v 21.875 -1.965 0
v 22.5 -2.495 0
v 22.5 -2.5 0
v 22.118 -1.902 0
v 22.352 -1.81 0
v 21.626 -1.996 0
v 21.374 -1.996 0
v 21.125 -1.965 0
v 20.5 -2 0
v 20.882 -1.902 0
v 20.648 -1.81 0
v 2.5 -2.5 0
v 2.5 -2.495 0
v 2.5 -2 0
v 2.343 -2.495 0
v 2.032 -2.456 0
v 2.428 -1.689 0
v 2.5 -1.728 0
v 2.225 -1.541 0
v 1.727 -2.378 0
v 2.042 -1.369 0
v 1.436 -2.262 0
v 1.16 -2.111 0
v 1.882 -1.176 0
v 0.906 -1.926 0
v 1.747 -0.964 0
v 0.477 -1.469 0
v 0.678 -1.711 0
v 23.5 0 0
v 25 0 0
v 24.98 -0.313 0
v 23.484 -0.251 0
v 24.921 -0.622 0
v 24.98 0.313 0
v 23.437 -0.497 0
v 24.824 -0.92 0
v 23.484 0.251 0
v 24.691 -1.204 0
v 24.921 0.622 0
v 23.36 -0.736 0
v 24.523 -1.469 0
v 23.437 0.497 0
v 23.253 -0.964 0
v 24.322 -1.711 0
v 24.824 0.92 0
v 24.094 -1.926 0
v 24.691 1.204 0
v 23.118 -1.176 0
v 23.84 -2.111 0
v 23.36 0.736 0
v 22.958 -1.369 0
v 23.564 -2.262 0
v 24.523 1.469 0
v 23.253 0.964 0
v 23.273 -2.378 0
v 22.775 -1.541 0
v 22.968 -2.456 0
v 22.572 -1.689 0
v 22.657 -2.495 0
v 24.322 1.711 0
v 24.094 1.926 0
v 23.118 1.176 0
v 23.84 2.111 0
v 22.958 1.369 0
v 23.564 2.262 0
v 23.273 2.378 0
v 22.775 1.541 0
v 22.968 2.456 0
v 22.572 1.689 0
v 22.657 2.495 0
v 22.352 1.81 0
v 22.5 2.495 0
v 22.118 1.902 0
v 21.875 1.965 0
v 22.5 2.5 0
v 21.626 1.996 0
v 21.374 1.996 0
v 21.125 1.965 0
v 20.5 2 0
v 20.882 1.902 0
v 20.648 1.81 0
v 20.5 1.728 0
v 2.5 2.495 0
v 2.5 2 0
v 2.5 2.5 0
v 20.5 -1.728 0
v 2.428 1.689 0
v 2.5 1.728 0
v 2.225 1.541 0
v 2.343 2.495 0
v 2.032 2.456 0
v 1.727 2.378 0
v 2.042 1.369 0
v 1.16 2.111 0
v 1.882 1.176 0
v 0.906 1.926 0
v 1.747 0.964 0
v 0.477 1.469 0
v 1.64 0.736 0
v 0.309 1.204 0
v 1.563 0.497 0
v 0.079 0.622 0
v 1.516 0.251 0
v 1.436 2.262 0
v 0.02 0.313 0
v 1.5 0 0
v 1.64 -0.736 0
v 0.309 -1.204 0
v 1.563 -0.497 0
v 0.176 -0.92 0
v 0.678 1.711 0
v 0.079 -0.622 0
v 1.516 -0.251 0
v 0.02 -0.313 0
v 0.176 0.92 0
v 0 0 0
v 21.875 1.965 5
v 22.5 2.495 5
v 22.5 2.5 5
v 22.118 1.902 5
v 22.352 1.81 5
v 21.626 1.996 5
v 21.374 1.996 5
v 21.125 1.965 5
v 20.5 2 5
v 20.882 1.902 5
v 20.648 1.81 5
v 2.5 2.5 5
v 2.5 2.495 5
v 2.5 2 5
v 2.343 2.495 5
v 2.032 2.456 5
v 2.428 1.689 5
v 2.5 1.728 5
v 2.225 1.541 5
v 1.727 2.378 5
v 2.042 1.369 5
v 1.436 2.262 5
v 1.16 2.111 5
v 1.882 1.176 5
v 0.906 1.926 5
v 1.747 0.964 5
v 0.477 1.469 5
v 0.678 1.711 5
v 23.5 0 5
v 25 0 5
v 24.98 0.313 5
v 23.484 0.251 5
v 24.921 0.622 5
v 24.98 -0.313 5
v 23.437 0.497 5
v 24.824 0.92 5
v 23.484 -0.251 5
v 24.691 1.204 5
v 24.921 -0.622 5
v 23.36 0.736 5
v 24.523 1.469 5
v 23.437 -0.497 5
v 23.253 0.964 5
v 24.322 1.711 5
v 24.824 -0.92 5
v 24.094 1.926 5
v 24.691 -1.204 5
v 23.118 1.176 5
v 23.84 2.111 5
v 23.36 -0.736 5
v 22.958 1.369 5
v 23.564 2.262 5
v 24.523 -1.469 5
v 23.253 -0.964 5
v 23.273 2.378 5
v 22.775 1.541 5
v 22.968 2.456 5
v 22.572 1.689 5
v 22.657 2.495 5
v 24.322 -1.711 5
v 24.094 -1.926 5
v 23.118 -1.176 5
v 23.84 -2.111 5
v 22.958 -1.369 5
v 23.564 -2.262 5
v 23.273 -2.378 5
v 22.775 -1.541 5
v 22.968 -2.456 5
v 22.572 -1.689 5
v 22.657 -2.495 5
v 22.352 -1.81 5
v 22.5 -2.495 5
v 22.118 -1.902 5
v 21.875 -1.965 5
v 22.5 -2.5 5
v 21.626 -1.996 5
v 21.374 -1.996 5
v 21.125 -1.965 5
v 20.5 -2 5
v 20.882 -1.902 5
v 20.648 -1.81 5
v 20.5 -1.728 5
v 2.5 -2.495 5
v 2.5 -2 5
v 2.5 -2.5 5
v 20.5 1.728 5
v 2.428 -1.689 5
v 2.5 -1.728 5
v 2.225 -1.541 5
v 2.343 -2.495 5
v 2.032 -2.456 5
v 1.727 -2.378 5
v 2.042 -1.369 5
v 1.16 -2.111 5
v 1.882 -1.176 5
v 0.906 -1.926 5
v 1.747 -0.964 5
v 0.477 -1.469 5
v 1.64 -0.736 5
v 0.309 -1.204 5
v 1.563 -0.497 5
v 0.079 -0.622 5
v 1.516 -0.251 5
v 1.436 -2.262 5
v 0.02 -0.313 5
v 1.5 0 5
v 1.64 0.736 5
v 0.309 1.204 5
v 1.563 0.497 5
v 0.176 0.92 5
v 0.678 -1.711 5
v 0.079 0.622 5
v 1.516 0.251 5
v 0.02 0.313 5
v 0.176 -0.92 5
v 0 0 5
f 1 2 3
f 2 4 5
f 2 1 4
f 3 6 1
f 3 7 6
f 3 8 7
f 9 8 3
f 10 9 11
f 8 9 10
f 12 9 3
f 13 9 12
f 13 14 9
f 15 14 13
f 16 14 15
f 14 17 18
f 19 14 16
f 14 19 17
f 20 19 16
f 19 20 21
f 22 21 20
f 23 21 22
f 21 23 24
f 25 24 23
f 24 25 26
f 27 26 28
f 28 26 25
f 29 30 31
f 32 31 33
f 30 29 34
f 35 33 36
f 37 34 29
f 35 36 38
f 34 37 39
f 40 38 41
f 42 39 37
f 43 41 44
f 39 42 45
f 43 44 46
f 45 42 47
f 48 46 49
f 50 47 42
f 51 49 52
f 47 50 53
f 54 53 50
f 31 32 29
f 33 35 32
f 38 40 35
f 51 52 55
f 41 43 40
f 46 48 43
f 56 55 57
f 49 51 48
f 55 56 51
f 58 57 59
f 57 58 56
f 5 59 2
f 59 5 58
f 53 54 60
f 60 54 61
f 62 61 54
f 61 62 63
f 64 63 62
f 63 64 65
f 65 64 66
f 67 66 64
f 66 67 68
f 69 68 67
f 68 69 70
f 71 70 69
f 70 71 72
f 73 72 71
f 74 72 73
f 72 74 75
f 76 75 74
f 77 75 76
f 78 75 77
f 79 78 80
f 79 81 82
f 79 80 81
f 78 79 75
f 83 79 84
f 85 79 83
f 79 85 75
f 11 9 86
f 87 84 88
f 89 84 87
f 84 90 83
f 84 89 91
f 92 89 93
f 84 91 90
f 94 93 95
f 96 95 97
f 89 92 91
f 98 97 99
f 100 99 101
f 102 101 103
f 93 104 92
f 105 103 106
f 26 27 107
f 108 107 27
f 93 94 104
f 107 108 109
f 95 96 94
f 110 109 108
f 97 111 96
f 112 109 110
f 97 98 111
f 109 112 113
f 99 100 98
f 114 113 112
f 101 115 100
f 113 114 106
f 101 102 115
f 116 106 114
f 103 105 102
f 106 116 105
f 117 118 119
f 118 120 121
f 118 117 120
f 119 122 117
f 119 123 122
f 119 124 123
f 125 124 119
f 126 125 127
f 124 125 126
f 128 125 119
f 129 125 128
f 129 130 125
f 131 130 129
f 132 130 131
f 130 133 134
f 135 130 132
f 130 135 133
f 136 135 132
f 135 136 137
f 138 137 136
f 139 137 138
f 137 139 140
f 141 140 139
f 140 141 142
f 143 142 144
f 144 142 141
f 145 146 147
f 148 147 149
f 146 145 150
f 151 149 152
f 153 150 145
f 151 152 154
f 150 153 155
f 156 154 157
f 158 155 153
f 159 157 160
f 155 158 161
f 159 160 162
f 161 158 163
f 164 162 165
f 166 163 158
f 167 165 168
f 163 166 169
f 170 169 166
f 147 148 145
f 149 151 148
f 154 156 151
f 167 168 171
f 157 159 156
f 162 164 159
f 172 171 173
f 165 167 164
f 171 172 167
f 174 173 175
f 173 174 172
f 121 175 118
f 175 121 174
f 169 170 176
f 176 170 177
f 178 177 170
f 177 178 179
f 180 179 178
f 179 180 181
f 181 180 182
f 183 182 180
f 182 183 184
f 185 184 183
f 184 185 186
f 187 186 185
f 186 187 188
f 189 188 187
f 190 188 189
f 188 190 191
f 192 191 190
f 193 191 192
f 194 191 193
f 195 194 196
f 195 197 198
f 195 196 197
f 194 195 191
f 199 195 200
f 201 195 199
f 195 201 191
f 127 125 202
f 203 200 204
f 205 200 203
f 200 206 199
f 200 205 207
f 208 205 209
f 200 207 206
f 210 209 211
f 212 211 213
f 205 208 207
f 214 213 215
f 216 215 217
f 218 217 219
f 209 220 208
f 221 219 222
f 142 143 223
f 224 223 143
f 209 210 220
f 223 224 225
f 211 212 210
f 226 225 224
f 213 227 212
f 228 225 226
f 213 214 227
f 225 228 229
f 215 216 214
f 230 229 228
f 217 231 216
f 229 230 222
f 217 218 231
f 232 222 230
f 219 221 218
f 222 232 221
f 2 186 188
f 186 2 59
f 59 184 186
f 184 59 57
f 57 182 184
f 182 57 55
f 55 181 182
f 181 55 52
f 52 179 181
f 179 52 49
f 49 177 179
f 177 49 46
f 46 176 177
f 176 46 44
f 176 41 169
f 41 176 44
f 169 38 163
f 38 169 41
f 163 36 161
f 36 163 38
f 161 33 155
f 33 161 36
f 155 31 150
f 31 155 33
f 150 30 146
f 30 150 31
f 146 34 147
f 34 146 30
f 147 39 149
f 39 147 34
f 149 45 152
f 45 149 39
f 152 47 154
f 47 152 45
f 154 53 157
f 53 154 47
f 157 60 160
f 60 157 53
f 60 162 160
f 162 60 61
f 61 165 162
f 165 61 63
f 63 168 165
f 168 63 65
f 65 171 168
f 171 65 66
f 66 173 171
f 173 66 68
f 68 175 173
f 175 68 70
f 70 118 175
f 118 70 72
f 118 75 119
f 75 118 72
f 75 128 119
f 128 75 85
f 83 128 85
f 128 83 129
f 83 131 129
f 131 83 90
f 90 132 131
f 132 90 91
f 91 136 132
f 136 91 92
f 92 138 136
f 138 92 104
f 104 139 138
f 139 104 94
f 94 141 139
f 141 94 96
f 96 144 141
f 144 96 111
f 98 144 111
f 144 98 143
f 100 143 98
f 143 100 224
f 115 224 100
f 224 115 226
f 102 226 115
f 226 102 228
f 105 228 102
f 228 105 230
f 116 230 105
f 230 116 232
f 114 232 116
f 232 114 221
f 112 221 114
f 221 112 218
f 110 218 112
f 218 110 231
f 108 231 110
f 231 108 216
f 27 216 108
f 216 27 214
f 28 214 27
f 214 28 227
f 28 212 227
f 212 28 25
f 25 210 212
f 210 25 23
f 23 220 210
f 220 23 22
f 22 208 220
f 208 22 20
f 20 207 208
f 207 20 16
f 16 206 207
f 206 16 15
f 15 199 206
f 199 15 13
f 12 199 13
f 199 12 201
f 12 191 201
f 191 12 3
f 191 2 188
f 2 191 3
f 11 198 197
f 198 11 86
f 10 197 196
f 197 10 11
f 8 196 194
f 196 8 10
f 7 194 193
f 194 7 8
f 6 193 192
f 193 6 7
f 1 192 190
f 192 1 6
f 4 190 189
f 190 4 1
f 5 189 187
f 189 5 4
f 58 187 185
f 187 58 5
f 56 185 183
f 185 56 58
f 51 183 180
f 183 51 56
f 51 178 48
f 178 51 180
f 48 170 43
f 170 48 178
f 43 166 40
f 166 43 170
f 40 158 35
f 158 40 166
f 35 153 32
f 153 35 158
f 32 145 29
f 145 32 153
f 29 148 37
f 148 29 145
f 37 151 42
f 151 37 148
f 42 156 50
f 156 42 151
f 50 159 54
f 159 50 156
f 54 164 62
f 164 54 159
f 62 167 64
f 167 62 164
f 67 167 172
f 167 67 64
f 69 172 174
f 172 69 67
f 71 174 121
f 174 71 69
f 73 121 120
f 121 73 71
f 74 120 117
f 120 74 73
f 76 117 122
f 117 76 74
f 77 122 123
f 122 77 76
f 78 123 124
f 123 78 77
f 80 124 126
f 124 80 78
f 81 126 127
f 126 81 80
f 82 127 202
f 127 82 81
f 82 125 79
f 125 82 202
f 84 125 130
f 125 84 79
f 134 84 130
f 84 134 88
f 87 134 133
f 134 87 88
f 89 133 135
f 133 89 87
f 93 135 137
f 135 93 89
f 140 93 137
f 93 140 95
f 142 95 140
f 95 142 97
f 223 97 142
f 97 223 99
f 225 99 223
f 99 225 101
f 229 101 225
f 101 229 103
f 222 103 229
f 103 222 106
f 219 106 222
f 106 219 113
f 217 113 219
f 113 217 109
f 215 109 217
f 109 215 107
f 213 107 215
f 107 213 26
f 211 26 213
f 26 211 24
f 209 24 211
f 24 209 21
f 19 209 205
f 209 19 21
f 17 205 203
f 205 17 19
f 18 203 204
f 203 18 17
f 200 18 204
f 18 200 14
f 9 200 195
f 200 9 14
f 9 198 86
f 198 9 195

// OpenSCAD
/*
 This file provides simple modules for dealing with complex shapes
 */


module rounded_rectangle(
  w = 5,
  l = 20,
  h = 5,
) {
  translate([w/2, 0, h/2])
  linear_extrude(height=h, center=true) {
    union() {
      translate([0, 0, 0])
      circle(d=w, $fn=50);
      translate([w*2, 0, 0])
      square([l, w], center=true);
      translate([l, 0, 0])
      circle(d=w, $fn=50);
    }
  }
}

difference() {
  rounded_rectangle();
  translate([1.5, 0, 0])
  rounded_rectangle(w=4, l=18, h=5);
}
